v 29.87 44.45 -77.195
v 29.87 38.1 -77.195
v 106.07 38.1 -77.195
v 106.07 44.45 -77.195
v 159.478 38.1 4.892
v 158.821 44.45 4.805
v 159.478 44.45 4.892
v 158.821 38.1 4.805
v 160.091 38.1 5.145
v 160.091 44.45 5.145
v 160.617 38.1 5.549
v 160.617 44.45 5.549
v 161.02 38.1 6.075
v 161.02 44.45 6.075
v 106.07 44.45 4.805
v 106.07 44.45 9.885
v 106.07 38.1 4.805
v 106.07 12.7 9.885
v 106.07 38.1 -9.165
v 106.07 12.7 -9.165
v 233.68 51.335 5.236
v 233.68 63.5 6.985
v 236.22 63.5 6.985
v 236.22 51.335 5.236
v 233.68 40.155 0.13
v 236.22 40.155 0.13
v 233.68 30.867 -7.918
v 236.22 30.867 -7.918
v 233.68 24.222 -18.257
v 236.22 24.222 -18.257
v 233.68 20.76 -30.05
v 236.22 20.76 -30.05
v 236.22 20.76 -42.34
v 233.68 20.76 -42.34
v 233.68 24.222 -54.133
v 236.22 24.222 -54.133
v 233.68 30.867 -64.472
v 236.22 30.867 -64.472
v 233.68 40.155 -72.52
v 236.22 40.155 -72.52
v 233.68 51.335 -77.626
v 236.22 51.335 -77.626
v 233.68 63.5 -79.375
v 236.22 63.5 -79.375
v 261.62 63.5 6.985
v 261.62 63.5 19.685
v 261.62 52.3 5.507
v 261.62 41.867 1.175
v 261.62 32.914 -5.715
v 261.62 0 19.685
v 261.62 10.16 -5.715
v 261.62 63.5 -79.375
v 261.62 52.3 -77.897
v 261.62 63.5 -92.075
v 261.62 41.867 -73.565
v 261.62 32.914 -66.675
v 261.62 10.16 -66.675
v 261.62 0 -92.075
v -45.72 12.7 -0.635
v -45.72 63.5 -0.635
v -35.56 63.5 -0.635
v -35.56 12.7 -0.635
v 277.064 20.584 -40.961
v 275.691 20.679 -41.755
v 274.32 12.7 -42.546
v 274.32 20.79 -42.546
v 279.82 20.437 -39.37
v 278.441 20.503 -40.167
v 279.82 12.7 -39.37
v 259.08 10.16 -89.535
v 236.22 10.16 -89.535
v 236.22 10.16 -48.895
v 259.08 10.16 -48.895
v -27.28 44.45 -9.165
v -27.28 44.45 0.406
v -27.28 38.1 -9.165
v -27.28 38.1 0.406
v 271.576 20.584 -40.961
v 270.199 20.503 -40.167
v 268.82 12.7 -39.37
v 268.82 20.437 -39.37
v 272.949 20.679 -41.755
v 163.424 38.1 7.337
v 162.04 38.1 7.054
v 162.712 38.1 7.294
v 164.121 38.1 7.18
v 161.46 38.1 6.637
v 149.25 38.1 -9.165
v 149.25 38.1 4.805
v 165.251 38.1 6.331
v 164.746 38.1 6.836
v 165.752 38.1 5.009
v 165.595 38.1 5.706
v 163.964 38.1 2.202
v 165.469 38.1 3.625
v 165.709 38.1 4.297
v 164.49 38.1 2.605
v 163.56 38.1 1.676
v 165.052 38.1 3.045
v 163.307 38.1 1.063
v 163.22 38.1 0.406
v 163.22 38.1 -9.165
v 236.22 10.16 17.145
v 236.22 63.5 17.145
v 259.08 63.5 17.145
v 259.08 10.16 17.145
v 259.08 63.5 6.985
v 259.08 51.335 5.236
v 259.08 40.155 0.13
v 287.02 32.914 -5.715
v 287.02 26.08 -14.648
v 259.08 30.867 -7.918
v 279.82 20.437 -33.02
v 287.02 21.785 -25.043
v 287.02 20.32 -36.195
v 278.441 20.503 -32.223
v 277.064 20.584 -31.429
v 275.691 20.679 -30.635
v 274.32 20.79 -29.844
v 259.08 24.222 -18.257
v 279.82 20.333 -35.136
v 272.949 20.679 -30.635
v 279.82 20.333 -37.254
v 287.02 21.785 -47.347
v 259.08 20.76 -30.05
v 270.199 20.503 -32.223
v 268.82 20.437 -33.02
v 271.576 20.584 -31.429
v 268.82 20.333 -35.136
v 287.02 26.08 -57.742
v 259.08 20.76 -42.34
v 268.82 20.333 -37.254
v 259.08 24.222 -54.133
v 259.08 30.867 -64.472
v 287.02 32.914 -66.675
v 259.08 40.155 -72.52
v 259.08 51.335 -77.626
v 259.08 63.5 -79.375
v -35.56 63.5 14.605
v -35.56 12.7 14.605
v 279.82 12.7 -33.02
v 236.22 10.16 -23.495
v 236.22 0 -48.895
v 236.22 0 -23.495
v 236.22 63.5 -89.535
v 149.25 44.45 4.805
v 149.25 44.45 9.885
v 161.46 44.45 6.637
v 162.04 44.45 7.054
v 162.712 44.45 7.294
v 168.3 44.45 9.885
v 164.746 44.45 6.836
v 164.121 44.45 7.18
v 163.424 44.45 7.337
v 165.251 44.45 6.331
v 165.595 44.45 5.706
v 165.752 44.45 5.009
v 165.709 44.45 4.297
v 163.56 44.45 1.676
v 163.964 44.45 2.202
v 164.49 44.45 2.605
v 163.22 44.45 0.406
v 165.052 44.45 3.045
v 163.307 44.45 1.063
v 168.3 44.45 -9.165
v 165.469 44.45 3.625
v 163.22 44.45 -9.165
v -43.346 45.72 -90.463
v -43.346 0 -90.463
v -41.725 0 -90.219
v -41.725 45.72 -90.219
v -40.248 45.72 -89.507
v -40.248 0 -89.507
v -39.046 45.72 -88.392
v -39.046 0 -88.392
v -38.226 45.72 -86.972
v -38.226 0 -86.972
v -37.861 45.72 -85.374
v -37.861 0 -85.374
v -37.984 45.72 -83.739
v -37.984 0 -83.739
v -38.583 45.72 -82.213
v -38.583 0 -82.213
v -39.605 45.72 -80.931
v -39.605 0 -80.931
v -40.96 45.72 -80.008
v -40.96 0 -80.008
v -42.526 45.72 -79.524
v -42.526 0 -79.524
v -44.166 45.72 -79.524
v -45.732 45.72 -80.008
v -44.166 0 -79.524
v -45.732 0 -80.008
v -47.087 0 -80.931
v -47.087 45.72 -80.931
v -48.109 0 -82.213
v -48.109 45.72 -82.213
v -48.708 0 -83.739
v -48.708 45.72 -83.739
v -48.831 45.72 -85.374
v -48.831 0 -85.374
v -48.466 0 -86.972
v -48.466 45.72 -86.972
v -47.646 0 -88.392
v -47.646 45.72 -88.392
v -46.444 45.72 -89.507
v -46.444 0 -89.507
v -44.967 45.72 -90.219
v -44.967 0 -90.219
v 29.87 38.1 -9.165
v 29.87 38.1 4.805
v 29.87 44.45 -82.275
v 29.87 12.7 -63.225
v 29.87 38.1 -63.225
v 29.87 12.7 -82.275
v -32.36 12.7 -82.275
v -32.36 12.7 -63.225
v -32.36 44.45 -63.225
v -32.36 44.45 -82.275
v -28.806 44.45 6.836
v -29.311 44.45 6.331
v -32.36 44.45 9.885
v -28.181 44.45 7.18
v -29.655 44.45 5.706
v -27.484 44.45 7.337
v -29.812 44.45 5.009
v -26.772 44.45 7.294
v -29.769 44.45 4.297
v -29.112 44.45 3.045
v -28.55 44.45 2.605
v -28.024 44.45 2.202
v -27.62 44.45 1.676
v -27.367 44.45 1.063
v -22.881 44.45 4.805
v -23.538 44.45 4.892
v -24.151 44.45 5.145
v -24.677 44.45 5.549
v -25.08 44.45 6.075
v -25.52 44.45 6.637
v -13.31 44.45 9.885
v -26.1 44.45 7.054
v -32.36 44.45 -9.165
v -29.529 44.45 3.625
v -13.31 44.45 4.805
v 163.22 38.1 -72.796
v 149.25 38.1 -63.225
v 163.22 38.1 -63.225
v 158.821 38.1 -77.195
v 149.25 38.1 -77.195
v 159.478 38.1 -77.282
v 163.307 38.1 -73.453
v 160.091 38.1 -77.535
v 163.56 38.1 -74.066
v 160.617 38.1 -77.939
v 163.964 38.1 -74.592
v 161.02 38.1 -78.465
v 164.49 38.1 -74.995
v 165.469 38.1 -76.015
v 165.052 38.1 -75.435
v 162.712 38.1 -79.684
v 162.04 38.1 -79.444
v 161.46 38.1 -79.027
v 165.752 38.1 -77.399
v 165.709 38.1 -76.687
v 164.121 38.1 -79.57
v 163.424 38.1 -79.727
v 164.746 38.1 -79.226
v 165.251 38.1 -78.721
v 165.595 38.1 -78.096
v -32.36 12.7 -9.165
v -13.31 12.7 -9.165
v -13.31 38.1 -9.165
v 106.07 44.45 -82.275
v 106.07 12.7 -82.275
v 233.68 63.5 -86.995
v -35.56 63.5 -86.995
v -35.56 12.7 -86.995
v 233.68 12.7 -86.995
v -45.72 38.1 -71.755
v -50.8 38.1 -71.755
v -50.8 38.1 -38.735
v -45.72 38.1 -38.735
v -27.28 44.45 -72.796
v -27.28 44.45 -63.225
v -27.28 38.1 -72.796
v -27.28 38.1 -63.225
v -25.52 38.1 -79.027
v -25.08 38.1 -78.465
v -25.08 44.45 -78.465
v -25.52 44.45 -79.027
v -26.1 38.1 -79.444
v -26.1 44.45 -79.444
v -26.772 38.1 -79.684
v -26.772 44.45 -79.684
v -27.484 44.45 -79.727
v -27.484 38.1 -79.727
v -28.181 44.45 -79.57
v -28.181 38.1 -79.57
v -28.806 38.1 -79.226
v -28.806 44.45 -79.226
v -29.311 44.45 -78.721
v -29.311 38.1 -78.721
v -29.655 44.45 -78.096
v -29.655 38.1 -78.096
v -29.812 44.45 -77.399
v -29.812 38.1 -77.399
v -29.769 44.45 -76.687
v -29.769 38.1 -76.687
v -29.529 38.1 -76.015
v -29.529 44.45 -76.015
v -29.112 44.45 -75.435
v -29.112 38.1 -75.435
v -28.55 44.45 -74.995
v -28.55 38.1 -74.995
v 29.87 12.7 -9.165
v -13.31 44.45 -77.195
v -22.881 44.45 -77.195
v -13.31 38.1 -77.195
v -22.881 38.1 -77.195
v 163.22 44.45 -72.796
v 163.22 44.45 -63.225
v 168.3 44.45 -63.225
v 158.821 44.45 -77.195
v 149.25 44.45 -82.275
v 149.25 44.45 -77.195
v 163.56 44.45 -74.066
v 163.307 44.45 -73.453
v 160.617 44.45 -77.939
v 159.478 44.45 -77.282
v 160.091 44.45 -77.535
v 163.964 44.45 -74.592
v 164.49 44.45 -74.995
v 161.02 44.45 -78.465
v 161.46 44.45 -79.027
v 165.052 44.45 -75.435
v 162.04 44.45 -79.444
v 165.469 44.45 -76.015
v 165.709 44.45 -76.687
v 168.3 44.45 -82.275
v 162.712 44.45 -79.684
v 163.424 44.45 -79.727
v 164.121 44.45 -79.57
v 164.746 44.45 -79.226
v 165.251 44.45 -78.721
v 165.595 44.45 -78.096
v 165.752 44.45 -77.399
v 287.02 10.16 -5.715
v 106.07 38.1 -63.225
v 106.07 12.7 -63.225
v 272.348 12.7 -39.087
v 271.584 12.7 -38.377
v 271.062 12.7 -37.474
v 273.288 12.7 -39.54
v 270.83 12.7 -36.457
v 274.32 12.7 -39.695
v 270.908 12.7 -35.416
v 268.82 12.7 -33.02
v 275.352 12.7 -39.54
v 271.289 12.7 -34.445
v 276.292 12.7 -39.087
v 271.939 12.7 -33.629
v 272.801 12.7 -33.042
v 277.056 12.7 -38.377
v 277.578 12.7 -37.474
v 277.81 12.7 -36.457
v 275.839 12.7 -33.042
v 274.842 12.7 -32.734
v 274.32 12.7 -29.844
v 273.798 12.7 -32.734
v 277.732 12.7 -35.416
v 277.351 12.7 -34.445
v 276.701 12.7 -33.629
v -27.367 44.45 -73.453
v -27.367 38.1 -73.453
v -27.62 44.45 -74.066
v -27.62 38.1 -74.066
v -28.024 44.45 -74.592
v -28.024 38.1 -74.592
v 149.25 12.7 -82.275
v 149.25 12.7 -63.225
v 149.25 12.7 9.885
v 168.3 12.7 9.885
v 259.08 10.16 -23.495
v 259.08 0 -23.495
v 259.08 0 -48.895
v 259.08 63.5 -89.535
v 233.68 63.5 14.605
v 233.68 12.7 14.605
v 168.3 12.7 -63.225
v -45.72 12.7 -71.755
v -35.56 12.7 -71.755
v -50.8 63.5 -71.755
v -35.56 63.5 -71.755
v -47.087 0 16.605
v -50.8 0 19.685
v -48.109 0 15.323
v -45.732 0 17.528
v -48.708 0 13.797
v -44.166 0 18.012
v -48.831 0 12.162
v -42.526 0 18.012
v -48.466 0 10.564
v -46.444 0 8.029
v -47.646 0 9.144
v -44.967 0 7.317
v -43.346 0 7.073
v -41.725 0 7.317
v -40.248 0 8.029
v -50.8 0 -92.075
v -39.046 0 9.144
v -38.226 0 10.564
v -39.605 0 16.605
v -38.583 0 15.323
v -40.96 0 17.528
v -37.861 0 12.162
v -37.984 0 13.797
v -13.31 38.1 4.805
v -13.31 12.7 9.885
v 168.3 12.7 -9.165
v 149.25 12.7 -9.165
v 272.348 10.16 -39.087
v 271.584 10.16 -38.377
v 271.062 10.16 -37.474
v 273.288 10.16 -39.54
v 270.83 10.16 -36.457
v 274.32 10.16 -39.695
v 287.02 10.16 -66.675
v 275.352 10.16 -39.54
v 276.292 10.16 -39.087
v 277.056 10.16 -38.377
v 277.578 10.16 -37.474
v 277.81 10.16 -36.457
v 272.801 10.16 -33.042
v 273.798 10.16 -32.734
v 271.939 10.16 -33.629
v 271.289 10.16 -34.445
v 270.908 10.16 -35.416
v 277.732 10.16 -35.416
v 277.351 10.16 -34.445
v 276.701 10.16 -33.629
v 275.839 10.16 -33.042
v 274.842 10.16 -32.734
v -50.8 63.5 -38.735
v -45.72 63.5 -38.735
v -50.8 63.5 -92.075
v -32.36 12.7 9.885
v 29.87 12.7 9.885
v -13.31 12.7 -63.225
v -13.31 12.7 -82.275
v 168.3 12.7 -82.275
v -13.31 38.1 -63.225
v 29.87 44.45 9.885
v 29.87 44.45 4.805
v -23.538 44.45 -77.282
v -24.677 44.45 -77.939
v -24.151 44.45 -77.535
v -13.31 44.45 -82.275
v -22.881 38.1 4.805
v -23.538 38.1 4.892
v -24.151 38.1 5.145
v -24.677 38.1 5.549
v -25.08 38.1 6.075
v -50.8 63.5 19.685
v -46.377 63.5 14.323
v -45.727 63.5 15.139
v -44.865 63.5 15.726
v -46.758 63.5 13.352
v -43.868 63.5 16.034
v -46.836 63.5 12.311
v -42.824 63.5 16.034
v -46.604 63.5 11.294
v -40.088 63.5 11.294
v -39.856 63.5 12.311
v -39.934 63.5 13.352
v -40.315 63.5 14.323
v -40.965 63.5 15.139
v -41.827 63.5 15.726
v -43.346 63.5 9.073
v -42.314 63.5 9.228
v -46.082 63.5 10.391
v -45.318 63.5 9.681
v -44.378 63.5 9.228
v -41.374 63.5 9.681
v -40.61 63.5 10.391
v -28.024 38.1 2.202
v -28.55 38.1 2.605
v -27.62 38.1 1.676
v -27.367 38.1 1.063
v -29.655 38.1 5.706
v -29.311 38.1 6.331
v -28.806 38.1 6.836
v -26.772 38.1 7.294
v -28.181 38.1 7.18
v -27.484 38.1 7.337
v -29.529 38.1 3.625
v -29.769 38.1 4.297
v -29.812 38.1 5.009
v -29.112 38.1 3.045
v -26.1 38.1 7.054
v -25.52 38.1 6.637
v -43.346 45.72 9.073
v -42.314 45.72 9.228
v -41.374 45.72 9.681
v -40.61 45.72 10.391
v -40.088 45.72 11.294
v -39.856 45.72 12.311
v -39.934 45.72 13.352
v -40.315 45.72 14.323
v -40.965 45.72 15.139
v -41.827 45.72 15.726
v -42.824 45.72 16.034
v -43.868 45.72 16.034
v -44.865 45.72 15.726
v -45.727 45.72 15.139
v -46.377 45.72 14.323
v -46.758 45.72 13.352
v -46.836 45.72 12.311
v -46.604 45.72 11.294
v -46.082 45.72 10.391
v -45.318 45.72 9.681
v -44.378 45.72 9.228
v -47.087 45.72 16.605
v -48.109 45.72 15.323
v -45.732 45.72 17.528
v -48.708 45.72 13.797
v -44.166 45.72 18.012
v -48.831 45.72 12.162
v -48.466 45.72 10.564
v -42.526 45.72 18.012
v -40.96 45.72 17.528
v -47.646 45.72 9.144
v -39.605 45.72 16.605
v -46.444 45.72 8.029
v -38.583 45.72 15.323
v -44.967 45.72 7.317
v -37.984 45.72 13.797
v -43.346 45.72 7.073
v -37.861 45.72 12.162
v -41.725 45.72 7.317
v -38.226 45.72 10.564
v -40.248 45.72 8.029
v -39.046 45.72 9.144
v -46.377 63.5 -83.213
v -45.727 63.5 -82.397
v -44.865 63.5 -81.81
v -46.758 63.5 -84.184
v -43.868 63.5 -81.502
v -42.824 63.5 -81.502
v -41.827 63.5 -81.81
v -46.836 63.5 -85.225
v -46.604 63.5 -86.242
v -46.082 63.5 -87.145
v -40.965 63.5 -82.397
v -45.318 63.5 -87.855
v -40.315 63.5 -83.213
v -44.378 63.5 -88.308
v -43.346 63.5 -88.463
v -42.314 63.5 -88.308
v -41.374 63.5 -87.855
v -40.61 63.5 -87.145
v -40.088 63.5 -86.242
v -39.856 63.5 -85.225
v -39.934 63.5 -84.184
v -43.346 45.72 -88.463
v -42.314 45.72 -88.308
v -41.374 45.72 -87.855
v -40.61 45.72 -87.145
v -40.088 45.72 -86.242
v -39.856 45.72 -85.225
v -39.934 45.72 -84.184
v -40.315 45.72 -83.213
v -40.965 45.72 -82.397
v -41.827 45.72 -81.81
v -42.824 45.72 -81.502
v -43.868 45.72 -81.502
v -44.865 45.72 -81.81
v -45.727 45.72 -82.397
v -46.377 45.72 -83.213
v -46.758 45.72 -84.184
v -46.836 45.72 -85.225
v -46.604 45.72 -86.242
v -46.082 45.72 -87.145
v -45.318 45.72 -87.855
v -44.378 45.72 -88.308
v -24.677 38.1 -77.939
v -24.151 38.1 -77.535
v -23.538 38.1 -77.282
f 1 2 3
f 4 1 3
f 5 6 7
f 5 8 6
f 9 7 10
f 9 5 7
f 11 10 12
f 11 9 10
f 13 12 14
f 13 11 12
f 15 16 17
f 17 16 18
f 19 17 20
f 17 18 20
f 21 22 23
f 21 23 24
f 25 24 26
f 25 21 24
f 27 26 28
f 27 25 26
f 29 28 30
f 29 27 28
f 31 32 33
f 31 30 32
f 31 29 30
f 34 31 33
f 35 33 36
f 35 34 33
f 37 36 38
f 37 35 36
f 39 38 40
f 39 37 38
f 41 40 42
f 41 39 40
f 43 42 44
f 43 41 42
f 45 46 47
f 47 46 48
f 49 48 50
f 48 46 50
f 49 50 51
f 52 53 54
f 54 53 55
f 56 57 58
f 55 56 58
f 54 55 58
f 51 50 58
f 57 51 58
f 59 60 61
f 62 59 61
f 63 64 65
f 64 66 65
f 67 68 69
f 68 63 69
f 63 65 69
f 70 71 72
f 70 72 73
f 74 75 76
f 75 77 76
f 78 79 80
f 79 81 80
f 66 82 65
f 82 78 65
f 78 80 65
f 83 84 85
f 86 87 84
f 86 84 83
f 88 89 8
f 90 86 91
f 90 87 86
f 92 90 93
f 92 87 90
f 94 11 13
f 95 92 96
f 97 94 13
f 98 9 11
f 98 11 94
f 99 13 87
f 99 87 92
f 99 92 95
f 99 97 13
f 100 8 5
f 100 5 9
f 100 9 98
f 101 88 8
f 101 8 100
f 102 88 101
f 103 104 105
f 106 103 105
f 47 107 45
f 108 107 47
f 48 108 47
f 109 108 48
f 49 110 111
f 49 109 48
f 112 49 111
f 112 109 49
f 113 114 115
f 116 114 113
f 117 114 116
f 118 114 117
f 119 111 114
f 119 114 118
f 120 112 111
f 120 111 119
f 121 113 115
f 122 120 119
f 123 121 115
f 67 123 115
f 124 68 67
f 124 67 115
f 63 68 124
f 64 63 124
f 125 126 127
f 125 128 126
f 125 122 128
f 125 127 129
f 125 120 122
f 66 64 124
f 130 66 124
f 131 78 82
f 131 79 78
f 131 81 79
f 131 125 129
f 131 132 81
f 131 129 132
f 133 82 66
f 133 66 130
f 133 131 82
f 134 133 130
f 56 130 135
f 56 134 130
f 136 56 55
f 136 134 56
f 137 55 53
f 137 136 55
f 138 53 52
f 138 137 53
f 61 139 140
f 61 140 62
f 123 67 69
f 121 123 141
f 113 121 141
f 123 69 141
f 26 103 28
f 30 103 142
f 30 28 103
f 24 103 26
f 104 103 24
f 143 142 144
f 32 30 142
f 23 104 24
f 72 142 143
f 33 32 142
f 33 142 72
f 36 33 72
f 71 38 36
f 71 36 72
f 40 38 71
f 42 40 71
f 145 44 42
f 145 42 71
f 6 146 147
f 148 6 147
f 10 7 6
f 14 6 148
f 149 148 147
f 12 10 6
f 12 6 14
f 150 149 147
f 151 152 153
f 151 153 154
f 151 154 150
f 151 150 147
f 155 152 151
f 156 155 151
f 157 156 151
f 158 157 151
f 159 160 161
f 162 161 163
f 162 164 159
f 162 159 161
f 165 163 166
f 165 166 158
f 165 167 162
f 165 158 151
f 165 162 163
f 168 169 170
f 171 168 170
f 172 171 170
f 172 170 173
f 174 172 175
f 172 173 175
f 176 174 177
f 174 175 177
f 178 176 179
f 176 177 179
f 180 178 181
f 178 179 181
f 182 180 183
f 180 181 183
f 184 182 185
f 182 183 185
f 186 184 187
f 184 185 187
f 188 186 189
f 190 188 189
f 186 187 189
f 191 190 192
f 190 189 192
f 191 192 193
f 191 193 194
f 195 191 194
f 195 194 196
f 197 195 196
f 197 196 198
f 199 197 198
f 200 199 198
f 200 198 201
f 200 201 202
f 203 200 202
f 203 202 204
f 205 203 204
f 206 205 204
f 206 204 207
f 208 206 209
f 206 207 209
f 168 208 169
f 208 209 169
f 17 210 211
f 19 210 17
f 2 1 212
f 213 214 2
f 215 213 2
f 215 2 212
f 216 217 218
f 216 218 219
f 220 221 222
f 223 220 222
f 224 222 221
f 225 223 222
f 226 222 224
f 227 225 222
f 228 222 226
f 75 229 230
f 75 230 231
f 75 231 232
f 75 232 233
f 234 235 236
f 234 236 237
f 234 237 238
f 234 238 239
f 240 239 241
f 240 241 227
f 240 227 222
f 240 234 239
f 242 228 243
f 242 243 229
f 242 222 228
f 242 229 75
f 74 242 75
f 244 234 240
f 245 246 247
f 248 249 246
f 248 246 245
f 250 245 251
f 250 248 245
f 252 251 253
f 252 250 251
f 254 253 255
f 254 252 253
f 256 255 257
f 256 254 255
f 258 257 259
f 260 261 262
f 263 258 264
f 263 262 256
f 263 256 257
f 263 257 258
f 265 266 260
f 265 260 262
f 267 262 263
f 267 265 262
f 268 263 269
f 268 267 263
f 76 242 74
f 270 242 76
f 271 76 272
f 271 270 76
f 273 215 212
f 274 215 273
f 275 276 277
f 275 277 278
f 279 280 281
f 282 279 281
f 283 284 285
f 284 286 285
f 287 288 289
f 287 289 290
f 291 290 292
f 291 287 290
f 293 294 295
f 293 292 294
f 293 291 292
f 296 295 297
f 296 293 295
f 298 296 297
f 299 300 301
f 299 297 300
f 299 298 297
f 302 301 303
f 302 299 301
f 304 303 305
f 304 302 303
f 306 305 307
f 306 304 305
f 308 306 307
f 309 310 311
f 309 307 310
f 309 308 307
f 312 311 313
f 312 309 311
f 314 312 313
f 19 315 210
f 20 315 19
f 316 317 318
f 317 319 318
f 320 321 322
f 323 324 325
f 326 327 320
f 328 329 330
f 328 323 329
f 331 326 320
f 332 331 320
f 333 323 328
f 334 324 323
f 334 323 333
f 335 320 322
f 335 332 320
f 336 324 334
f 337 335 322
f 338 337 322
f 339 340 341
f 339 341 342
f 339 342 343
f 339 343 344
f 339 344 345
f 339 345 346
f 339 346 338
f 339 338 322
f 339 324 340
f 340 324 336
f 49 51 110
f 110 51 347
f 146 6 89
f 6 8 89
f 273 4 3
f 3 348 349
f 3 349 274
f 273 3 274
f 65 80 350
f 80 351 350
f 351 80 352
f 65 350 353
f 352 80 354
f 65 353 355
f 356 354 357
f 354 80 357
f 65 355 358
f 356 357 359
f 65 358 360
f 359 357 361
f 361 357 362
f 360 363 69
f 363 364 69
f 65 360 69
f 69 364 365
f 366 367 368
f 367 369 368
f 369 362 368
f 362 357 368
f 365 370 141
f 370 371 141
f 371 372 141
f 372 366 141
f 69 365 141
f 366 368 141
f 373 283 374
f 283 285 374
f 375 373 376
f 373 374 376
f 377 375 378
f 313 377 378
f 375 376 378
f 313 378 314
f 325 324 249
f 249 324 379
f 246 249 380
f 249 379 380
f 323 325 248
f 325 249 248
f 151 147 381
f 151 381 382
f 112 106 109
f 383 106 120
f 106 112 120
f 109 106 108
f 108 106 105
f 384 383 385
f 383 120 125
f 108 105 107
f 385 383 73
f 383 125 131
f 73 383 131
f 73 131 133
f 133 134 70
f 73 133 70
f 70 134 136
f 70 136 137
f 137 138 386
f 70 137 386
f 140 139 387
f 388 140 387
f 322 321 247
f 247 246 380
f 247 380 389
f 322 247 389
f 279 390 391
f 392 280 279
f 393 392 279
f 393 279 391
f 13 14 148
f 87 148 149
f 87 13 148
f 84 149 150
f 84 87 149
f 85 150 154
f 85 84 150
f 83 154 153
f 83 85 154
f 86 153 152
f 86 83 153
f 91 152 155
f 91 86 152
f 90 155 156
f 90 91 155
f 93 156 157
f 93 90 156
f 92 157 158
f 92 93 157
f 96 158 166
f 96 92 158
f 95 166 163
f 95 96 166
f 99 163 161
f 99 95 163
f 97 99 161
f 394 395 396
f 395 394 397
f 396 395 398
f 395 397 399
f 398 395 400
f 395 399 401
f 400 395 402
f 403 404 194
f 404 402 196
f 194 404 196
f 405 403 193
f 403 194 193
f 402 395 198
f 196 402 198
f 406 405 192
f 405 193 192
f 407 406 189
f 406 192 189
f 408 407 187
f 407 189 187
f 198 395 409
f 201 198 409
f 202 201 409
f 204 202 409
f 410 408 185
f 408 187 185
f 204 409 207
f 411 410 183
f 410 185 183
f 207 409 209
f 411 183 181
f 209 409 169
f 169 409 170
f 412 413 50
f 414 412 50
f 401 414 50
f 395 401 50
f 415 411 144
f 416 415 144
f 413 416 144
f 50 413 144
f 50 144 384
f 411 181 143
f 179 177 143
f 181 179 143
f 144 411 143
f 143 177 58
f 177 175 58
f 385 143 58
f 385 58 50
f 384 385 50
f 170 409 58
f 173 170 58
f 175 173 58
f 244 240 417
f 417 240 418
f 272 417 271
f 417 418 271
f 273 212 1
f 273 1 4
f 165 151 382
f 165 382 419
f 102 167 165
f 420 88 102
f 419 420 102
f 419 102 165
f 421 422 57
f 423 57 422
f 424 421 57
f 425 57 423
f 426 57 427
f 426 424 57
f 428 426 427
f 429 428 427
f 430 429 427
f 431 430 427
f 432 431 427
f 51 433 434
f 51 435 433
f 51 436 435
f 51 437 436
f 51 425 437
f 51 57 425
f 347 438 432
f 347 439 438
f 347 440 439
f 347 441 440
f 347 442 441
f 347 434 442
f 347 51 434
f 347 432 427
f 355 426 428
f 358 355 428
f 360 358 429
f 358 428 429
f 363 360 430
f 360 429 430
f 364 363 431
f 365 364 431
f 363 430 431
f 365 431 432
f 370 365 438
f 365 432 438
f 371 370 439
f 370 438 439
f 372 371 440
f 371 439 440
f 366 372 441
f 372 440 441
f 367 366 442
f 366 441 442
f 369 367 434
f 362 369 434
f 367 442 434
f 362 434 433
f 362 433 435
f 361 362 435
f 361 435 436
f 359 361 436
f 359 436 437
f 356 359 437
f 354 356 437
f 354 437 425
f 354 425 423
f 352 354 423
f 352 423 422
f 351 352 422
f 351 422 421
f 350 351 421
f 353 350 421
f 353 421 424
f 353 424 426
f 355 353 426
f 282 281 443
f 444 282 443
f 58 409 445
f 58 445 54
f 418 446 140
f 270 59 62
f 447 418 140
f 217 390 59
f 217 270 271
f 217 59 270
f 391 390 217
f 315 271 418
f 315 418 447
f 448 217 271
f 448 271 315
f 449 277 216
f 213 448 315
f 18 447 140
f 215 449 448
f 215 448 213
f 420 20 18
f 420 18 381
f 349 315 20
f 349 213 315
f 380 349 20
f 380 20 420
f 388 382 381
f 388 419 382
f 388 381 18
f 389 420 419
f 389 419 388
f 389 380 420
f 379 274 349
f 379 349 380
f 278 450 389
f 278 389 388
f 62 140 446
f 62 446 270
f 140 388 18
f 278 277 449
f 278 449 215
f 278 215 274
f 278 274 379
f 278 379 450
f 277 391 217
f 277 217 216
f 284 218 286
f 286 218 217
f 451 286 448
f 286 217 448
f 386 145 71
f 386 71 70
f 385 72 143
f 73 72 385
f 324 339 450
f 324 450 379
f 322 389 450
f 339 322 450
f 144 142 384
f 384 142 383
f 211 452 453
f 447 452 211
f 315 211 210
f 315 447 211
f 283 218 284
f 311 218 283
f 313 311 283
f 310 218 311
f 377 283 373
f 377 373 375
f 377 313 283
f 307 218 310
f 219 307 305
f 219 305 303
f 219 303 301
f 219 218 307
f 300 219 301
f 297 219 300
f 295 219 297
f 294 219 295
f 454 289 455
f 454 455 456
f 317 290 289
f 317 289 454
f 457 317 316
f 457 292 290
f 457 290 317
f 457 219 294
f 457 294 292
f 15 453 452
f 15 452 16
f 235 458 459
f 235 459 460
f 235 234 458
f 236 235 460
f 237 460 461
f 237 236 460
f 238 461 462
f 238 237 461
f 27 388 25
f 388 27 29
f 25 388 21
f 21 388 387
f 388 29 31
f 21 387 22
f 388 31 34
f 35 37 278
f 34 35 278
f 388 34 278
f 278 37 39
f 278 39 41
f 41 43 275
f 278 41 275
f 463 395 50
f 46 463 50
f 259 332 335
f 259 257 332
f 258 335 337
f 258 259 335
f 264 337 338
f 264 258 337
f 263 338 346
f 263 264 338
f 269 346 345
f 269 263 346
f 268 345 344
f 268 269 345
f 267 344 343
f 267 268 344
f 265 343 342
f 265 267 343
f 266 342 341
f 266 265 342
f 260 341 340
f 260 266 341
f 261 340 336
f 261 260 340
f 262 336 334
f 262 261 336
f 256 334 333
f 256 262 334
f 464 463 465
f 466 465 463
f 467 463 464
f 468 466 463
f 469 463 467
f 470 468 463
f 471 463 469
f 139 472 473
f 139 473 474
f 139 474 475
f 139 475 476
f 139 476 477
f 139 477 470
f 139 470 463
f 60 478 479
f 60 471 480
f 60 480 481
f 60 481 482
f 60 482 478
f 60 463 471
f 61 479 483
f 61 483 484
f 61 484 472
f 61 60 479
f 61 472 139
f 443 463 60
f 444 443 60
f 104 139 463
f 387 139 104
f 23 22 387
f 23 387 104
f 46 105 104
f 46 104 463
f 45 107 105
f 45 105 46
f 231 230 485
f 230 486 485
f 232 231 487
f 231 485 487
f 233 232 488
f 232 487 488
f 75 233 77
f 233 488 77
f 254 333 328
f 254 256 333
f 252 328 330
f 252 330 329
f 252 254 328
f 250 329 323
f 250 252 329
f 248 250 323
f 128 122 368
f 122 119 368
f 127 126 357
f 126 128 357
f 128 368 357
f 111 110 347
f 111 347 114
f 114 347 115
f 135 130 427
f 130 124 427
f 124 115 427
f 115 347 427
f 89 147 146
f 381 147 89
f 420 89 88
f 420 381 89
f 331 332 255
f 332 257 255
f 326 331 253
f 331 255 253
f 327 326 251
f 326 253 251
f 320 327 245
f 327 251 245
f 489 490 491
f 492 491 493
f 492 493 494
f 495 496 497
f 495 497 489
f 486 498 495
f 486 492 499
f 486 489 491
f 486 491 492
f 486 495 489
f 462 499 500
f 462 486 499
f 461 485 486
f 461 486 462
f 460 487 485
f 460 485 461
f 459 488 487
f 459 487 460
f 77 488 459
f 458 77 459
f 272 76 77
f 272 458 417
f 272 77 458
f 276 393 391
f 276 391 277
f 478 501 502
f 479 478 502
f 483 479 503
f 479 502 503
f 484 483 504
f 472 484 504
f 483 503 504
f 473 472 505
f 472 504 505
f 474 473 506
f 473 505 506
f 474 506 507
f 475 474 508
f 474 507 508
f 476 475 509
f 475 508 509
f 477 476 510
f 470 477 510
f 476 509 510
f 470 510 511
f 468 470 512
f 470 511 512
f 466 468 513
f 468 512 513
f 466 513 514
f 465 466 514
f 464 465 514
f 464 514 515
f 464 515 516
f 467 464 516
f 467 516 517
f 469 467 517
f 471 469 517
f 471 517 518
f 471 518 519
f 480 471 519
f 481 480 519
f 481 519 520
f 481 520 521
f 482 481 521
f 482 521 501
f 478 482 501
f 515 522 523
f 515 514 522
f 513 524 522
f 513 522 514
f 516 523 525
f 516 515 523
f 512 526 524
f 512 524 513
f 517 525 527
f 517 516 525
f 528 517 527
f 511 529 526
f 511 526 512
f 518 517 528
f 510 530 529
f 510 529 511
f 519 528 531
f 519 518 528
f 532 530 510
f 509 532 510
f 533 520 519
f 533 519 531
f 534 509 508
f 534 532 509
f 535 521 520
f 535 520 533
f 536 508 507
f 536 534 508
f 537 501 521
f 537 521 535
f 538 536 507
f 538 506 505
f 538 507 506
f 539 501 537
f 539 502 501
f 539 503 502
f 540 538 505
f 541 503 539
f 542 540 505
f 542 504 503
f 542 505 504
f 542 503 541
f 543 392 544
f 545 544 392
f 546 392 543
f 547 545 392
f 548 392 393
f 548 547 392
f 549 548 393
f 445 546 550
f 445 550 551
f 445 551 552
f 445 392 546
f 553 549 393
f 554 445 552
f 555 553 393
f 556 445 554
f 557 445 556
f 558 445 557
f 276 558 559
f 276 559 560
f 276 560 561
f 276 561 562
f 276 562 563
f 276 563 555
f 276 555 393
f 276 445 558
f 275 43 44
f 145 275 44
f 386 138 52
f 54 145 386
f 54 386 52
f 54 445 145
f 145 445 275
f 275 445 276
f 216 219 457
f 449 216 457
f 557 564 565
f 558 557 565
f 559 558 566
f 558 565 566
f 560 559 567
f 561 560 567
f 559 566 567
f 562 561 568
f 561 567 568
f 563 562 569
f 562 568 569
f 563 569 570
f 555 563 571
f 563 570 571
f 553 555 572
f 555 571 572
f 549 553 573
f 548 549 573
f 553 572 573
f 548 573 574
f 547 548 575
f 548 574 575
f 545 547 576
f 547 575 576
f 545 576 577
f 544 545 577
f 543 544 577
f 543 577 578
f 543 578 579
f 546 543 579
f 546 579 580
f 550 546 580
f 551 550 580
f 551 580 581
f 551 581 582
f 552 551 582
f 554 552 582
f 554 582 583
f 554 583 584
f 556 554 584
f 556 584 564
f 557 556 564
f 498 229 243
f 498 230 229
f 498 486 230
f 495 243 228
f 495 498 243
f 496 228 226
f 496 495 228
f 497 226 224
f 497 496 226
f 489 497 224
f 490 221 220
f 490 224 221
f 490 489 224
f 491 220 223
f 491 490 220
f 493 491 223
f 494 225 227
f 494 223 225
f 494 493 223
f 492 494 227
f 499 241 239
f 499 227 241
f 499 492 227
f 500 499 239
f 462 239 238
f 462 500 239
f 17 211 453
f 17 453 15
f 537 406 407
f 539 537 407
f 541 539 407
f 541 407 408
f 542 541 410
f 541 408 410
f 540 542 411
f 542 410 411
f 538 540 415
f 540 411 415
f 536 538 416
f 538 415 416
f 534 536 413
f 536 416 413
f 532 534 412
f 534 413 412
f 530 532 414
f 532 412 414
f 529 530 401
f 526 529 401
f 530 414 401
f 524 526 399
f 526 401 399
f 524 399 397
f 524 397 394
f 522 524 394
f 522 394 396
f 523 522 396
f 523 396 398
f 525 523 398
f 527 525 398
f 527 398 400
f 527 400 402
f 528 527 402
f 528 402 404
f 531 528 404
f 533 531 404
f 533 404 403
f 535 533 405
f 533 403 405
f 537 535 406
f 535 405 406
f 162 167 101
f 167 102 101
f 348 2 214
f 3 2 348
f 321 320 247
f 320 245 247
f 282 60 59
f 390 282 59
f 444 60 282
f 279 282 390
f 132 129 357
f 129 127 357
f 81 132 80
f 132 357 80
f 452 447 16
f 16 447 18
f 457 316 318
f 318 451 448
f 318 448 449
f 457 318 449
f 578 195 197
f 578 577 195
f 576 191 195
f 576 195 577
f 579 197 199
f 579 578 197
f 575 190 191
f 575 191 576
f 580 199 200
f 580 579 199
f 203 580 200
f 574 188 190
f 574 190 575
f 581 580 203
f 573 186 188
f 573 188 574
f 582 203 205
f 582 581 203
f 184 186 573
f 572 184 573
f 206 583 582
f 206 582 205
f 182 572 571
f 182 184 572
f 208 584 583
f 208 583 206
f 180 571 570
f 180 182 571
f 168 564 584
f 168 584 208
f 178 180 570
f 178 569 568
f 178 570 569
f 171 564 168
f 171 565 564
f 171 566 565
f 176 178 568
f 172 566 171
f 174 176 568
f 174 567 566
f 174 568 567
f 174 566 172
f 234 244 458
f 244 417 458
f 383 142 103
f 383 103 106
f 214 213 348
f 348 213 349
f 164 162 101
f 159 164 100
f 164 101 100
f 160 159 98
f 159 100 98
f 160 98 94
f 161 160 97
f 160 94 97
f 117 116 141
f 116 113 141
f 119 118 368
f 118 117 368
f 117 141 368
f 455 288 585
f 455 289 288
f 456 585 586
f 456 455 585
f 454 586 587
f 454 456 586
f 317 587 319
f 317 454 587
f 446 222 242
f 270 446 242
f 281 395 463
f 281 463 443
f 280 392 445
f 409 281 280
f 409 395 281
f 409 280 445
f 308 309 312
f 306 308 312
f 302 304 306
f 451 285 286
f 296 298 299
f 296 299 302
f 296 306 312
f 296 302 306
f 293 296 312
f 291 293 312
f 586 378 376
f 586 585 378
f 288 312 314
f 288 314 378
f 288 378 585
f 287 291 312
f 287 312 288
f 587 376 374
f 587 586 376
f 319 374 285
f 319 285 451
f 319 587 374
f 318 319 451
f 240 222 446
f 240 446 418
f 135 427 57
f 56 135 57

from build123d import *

# Parameters (mm, degrees)
SKETCH3_W           = 520.7
SKETCH3_H           = 111.76
BOSS_EXTRUDE1_DEPTH = 63.5
CUT_EXTRUDE1_START  = 6.35
SKETCH2_W           = 77.47
SKETCH2_H           = 77.47
CUT_EXTRUDE1_DEPTH  = 111.76
CUT_EXTRUDE2_DEPTH  = 156.718
SKETCH5_R           = 43.18
CUT_EXTRUDE3_DEPTH  = 355.6
SKETCH6_W           = 279.4
SKETCH6_H           = 101.6
CUT_EXTRUDE4_DEPTH  = 50.8
CUT_EXTRUDE5_DEPTH  = 174.244
SKETCH9_W           = 25.4
SKETCH9_H           = 60.96
CUT_EXTRUDE6_DEPTH  = 10.16
BOSS_EXTRUDE2_REACH = 310.043
SKETCH11_W          = 15.24
SKETCH11_H          = 20.32
SKETCH10_R          = 3.5
CUT_EXTRUDE7_DEPTH  = 76.2
SKETCH10_3_R        = 5.5
CUT_EXTRUDE8_DEPTH  = 45.72
SKETCH13_R          = 3.5
CUT_EXTRUDE9_DEPTH  = 34.448
CUT_EXTRUDE10_START = -2.54
SKETCH13_3_R        = 3.5
CUT_EXTRUDE10_DEPTH = 34.448
SKETCH14_W          = 19.05
SKETCH14_H          = 19.05
SKETCH14_W_2        = 76.2
BOSS_EXTRUDE3_DEPTH = 25.4
SKETCH14_3_W        = 76.2
SKETCH14_3_H        = 5.08
BOSS_EXTRUDE4_DEPTH = 31.75
SKETCH16_W          = 22.86
SKETCH16_H          = 106.68
CUT_EXTRUDE12_DEPTH = 53.34
SKETCH17_W          = 22.86
SKETCH17_H          = 25.4
CUT_EXTRUDE13_DEPTH = 52.54
SKETCH18_W          = 33.02
SKETCH18_H          = 25.4
CUT_EXTRUDE14_DEPTH = 17.018
SKETCH19_R          = 2.54
CUT_EXTRUDE15_DEPTH = 23.876
FILLET1_R           = 2.54


with BuildPart() as part:
    # Sketch3 → Boss-Extrude1 (new body)
    with BuildSketch(Plane(origin=(0, 0, 0), x_dir=(1, 0, 0), z_dir=(0, 1, 0))):
        with Locations((209.55, 36.195)):
            Rectangle(SKETCH3_W, SKETCH3_H)
    extrude(amount=BOSS_EXTRUDE1_DEPTH)

    # Sketch2 → Cut-Extrude1 (cut)
    with BuildSketch(Plane(origin=(0, 0, 0), x_dir=(1, 0, 0), z_dir=(0, 1, 0)).offset(CUT_EXTRUDE1_START)):
        with Locations((412.75, 36.195)):
            Rectangle(SKETCH2_W, SKETCH2_H)
    extrude(amount=CUT_EXTRUDE1_DEPTH, mode=Mode.SUBTRACT)

    # Sketch4 → Cut-Extrude2 (cut)
    with BuildSketch(Plane.XY.offset(19.685)):
        with BuildLine():
            Line((330.2, 12.7), (469.9, 12.7))
            Line((469.9, 12.7), (469.9, 63.5))
            Line((469.9, 63.5), (381, 63.5))
            ThreePointArc((381, 63.5), (294.278975516, 99.421024484), (330.2, 12.7))
        make_face()
    extrude(amount=-CUT_EXTRUDE2_DEPTH, mode=Mode.SUBTRACT)

    # Sketch5 → Cut-Extrude3 (cut)
    with BuildSketch(Plane(origin=(0, 0, 0), x_dir=(0, 0, -1), z_dir=(1, 0, 0))):
        with Locations((36.195, 63.5)):
            Circle(SKETCH5_R)
    extrude(amount=CUT_EXTRUDE3_DEPTH, mode=Mode.SUBTRACT)

    # Sketch6 → Cut-Extrude4 (cut)
    with BuildSketch(Plane(origin=(0, 63.5, 0), x_dir=(1, 0, 0), z_dir=(0, 1, 0))):
        with Locations((93.98, 36.195)):
            Rectangle(SKETCH6_W, SKETCH6_H)
    extrude(amount=-CUT_EXTRUDE4_DEPTH, mode=Mode.SUBTRACT)

    # Sketch7 → Cut-Revolve1 (revolve, cut)
    with BuildSketch(Plane(origin=(0, 63.5, 0), x_dir=(1, 0, 0), z_dir=(0, 1, 0))):
        with BuildLine():
            Line((241.3, -13.805), (245.161436971, -13.805))
            ThreePointArc((245.161436971, -13.805), (249.759619592, 11.007294884), (251.3, 36.195))
            Line((251.3, 36.195), (241.3, 36.195))
            Line((241.3, 36.195), (241.3, -13.805))
        make_face()
    revolve(axis=Axis((-45.72, 63.5, -36.195), (1, 0, 0)), mode=Mode.SUBTRACT)

    # Sketch8 → Cut-Extrude5 (cut)
    with BuildSketch(Plane.XZ):
        Polygon((261.62, 19.685), (261.62, -5.715), (287.02, -5.715), (287.02, -66.675), (261.62, -66.675), (261.62, -92.075), (609.54801076, -173.862508288), (609.54801076, 88.425228921), align=None)
    extrude(amount=-CUT_EXTRUDE5_DEPTH, mode=Mode.SUBTRACT)

    # Sketch9 → Cut-Extrude6 (cut)
    with BuildSketch(Plane.XZ):
        with Locations((274.32, -36.195)):
            Rectangle(SKETCH9_W, SKETCH9_H)
    extrude(amount=-CUT_EXTRUDE6_DEPTH, mode=Mode.SUBTRACT)

    # Sketch11 → Boss-Extrude2 (add, up to next)
    with BuildSketch(Plane(origin=(0, 63.5, 0), x_dir=(1, 0, 0), z_dir=(0, 1, 0)), mode=Mode.PRIVATE) as boss_extrude2_sk1:
        with Locations((-43.18, 81.915)):
            Rectangle(SKETCH11_W, SKETCH11_H)
    boss_extrude2_tool1 = extrude(boss_extrude2_sk1.sketch, amount=-BOSS_EXTRUDE2_REACH, mode=Mode.PRIVATE) - part.part
    # Sketch11 → Boss-Extrude2 (add, up to next)
    with BuildSketch(Plane(origin=(0, 63.5, 0), x_dir=(1, 0, 0), z_dir=(0, 1, 0)), mode=Mode.PRIVATE) as boss_extrude2_sk2:
        with Locations((-43.18, -9.525)):
            Rectangle(SKETCH11_W, SKETCH11_H)
    boss_extrude2_tool2 = extrude(boss_extrude2_sk2.sketch, amount=-BOSS_EXTRUDE2_REACH, mode=Mode.PRIVATE) - part.part
    add(boss_extrude2_tool1.solids().sort_by_distance((-43.18, 63.5, -81.915))[0])
    add(boss_extrude2_tool2.solids().sort_by_distance((-43.18, 63.5, 9.525))[0])

    # Sketch10 → Cut-Extrude7 (cut)
    with BuildSketch(Plane.XZ):
        with Locations((-43.346, -84.963)):
            Circle(SKETCH10_R)
        with Locations((-43.346, 12.573)):
            Circle(SKETCH10_R)
    extrude(amount=-CUT_EXTRUDE7_DEPTH, mode=Mode.SUBTRACT)

    # Sketch10<3> → Cut-Extrude8 (cut)
    with BuildSketch(Plane.XZ):
        with Locations((-43.346, 12.573)):
            Circle(SKETCH10_3_R)
        with Locations((-43.346, -84.963)):
            Circle(SKETCH10_3_R)
    extrude(amount=-CUT_EXTRUDE8_DEPTH, mode=Mode.SUBTRACT)

    # Sketch13 → Cut-Extrude9 (cut)
    with BuildSketch(Plane.XZ.offset(-10.16)):
        with Locations((274.32, -36.195)):
            Circle(SKETCH13_R)
    extrude(amount=-CUT_EXTRUDE9_DEPTH, mode=Mode.SUBTRACT)

    # Sketch13<3> → Cut-Extrude10 (cut)
    with BuildSketch(Plane.XZ.offset(-10.16).offset(CUT_EXTRUDE10_START)):
        Polygon((268.82, -39.370426481), (274.32, -42.545852961), (279.82, -39.370426481), (279.82, -33.019573519), (274.32, -29.844147039), (268.82, -33.019573519), align=None)
        with Locations((274.32, -36.195)):
            Circle(SKETCH13_3_R, mode=Mode.SUBTRACT)
    extrude(amount=-CUT_EXTRUDE10_DEPTH, mode=Mode.SUBTRACT)

    # Sketch14 → Boss-Extrude3 (add)
    with BuildSketch(Plane(origin=(0, 12.7, 0), x_dir=(1, 0, 0), z_dir=(0, 1, 0))):
        with Locations((-22.835, -0.36)):
            Rectangle(SKETCH14_W, SKETCH14_H)
        with Locations((67.97, -0.36)):
            Rectangle(SKETCH14_W_2, SKETCH14_H)
        with Locations((-22.835, 72.75)):
            Rectangle(SKETCH14_W, SKETCH14_H)
        with Locations((67.97, 72.75)):
            Rectangle(SKETCH14_W_2, SKETCH14_H)
        with Locations((158.775, -0.36)):
            Rectangle(SKETCH14_W, SKETCH14_H)
        with Locations((158.775, 72.75)):
            Rectangle(SKETCH14_W, SKETCH14_H)
    extrude(amount=BOSS_EXTRUDE3_DEPTH)

    # Sketch14<3> → Boss-Extrude4 (add)
    with BuildSketch(Plane(origin=(0, 12.7, 0), x_dir=(1, 0, 0), z_dir=(0, 1, 0))):
        Polygon((-13.31, -4.805), (-27.28, -4.805), (-27.28, 9.165), (-32.36, 9.165), (-32.36, -9.885), (-13.31, -9.885), align=None)
        with Locations((67.97, -7.345)):
            Rectangle(SKETCH14_3_W, SKETCH14_3_H)
        Polygon((-32.36, 63.225), (-27.28, 63.225), (-27.28, 77.195), (-13.31, 77.195), (-13.31, 82.275), (-32.36, 82.275), align=None)
        Polygon((163.22, -4.805), (149.25, -4.805), (149.25, -9.885), (168.3, -9.885), (168.3, 9.165), (163.22, 9.165), align=None)
        with Locations((67.97, 79.735)):
            Rectangle(SKETCH14_3_W, SKETCH14_3_H)
        Polygon((149.25, 82.275), (149.25, 77.195), (163.22, 77.195), (163.22, 63.225), (168.3, 63.225), (168.3, 82.275), align=None)
    extrude(amount=BOSS_EXTRUDE4_DEPTH)

    # Sketch16 → Cut-Extrude12 (cut)
    with BuildSketch(Plane(origin=(0, 63.5, 0), x_dir=(1, 0, 0), z_dir=(0, 1, 0))):
        with Locations((247.65, 36.195)):
            Rectangle(SKETCH16_W, SKETCH16_H)
    extrude(amount=-CUT_EXTRUDE12_DEPTH, mode=Mode.SUBTRACT)

    # Sketch17 → Cut-Extrude13 (cut)
    with BuildSketch(Plane(origin=(0, 10.16, 0), x_dir=(1, 0, 0), z_dir=(0, 1, 0))):
        with Locations((247.65, 36.195)):
            Rectangle(SKETCH17_W, SKETCH17_H)
    extrude(amount=-CUT_EXTRUDE13_DEPTH, mode=Mode.SUBTRACT)

    # Sketch18 → Cut-Extrude14 (cut)
    with BuildSketch(Plane.ZY.offset(50.8)):
        with Locations((-55.245, 50.8)):
            Rectangle(SKETCH18_W, SKETCH18_H)
    extrude(amount=-CUT_EXTRUDE14_DEPTH, mode=Mode.SUBTRACT)

    # Sketch19 → Cut-Extrude15 (cut)
    with BuildSketch(Plane(origin=(0, 38.1, 0), x_dir=(1, 0, 0), z_dir=(0, 1, 0))):
        with Locations((-27.28, 77.195)):
            Circle(SKETCH19_R)
        with Locations((163.22, 77.195)):
            Circle(SKETCH19_R)
        with Locations((163.22, -4.805)):
            Circle(SKETCH19_R)
        with Locations((-27.28, -4.805)):
            Circle(SKETCH19_R)
    extrude(amount=CUT_EXTRUDE15_DEPTH, mode=Mode.SUBTRACT)

    # Fillet1
    fillet1_edges = [part.edges().sort_by_distance(p)[0] for p in [
        (-24.74, 41.275, 4.805),
        (-27.28, 41.275, 2.265),
        (163.22, 41.275, 2.265),
        (160.68, 41.275, 4.805),
        (160.68, 41.275, -77.195),
        (163.22, 41.275, -74.655),
        (-27.28, 41.275, -74.655),
        (-24.74, 41.275, -77.195),
    ]]
    fillet(fillet1_edges, radius=FILLET1_R)


solid = part.part
